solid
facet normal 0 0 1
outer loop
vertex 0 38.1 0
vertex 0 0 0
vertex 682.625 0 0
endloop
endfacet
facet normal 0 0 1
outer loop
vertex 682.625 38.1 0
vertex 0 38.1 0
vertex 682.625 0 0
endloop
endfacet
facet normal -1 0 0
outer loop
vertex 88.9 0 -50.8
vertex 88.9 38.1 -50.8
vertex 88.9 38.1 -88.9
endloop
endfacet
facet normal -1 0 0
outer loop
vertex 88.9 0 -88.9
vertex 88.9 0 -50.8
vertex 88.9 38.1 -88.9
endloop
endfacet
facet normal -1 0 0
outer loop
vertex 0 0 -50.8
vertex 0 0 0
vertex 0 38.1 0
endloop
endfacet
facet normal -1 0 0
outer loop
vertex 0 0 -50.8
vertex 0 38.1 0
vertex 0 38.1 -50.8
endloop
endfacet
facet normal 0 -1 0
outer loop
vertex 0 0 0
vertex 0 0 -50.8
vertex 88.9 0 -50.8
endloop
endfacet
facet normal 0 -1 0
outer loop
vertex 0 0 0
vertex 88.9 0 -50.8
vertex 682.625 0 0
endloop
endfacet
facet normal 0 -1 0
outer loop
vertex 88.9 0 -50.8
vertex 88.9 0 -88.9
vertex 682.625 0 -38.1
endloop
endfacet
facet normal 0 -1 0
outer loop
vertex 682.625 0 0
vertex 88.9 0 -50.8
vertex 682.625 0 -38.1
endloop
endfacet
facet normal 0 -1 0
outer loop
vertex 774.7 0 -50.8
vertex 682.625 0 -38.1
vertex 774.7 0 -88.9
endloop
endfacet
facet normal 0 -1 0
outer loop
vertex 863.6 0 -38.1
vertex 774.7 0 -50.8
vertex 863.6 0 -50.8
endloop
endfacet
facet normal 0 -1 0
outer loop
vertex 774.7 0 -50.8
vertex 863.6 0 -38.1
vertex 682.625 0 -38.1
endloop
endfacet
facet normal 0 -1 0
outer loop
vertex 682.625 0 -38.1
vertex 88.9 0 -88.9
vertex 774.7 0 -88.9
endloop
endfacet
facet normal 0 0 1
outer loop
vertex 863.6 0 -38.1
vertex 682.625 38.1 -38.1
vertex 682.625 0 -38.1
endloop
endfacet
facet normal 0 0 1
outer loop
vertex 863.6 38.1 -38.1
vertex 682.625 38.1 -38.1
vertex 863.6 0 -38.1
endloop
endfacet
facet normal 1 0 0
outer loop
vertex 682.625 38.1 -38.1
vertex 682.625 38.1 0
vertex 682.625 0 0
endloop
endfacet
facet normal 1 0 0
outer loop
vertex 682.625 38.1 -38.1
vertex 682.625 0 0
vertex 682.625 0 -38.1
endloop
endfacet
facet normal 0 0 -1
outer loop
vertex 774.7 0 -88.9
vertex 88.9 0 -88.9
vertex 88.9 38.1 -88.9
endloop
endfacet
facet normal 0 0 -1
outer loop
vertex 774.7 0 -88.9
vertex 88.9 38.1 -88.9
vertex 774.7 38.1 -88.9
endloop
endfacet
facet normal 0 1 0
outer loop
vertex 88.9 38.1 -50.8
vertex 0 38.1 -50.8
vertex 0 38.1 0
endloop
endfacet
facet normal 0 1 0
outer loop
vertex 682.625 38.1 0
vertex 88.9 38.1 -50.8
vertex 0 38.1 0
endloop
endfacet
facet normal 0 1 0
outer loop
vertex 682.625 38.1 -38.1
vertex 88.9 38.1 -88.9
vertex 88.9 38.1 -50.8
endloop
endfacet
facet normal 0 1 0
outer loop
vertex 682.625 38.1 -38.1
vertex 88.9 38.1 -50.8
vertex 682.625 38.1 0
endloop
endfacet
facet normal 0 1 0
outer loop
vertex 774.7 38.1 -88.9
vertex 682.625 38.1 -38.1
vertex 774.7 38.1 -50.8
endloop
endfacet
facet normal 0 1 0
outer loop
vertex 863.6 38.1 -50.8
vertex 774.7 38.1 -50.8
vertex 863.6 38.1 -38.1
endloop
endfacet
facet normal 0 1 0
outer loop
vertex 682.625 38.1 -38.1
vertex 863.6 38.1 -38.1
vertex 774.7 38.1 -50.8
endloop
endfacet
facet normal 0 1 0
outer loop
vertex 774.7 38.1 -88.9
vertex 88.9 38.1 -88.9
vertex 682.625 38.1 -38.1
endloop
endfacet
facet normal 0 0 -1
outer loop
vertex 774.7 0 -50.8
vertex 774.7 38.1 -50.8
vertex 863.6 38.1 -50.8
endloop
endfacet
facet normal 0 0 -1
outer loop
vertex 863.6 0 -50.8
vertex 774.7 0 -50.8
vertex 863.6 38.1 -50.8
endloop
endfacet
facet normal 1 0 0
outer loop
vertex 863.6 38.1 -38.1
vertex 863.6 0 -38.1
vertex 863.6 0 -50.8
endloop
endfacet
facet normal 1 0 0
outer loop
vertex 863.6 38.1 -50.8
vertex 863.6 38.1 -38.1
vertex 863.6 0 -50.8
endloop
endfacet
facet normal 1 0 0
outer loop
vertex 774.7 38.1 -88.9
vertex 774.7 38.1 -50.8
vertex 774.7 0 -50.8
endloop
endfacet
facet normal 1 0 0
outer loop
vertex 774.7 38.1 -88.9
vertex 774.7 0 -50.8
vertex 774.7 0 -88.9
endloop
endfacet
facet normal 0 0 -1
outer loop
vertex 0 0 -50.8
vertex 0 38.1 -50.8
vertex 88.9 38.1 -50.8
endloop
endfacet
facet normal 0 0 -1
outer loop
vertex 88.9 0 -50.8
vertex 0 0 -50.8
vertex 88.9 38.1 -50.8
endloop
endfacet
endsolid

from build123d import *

# Parameters (mm, degrees)
SKETCH1_W           = 863.6
SKETCH1_H           = 88.9
BOSS_EXTRUDE1_DEPTH = 38.1
SKETCH3_W           = 88.9
SKETCH3_H           = 38.1
CUT_EXTRUDE1_DEPTH  = 39.1
SKETCH4_W           = 180.975
SKETCH4_H           = 38.1
CUT_EXTRUDE2_DEPTH  = 39.1


with BuildPart() as part:
    # Sketch1 → Boss-Extrude1 (new body)
    with BuildSketch(Plane(origin=(0, 0, 0), x_dir=(1, 0, 0), z_dir=(0, 1, 0))):
        with Locations((431.8, 44.45)):
            Rectangle(SKETCH1_W, SKETCH1_H)
    extrude(amount=BOSS_EXTRUDE1_DEPTH)

    # Sketch3 → Cut-Extrude1 (cut, through all)
    with BuildSketch(Plane(origin=(0, 38.1, 0), x_dir=(1, 0, 0), z_dir=(0, 1, 0))):
        with Locations((44.45, 69.85)):
            Rectangle(SKETCH3_W, SKETCH3_H)
        with Locations((819.15, 69.85)):
            Rectangle(SKETCH3_W, SKETCH3_H)
    extrude(amount=-CUT_EXTRUDE1_DEPTH, mode=Mode.SUBTRACT)

    # Sketch4 → Cut-Extrude2 (cut, through all)
    with BuildSketch(Plane(origin=(0, 38.1, 0), x_dir=(1, 0, 0), z_dir=(0, 1, 0))):
        with Locations((773.1125, 19.05)):
            Rectangle(SKETCH4_W, SKETCH4_H)
    extrude(amount=-CUT_EXTRUDE2_DEPTH, mode=Mode.SUBTRACT)


solid = part.part
